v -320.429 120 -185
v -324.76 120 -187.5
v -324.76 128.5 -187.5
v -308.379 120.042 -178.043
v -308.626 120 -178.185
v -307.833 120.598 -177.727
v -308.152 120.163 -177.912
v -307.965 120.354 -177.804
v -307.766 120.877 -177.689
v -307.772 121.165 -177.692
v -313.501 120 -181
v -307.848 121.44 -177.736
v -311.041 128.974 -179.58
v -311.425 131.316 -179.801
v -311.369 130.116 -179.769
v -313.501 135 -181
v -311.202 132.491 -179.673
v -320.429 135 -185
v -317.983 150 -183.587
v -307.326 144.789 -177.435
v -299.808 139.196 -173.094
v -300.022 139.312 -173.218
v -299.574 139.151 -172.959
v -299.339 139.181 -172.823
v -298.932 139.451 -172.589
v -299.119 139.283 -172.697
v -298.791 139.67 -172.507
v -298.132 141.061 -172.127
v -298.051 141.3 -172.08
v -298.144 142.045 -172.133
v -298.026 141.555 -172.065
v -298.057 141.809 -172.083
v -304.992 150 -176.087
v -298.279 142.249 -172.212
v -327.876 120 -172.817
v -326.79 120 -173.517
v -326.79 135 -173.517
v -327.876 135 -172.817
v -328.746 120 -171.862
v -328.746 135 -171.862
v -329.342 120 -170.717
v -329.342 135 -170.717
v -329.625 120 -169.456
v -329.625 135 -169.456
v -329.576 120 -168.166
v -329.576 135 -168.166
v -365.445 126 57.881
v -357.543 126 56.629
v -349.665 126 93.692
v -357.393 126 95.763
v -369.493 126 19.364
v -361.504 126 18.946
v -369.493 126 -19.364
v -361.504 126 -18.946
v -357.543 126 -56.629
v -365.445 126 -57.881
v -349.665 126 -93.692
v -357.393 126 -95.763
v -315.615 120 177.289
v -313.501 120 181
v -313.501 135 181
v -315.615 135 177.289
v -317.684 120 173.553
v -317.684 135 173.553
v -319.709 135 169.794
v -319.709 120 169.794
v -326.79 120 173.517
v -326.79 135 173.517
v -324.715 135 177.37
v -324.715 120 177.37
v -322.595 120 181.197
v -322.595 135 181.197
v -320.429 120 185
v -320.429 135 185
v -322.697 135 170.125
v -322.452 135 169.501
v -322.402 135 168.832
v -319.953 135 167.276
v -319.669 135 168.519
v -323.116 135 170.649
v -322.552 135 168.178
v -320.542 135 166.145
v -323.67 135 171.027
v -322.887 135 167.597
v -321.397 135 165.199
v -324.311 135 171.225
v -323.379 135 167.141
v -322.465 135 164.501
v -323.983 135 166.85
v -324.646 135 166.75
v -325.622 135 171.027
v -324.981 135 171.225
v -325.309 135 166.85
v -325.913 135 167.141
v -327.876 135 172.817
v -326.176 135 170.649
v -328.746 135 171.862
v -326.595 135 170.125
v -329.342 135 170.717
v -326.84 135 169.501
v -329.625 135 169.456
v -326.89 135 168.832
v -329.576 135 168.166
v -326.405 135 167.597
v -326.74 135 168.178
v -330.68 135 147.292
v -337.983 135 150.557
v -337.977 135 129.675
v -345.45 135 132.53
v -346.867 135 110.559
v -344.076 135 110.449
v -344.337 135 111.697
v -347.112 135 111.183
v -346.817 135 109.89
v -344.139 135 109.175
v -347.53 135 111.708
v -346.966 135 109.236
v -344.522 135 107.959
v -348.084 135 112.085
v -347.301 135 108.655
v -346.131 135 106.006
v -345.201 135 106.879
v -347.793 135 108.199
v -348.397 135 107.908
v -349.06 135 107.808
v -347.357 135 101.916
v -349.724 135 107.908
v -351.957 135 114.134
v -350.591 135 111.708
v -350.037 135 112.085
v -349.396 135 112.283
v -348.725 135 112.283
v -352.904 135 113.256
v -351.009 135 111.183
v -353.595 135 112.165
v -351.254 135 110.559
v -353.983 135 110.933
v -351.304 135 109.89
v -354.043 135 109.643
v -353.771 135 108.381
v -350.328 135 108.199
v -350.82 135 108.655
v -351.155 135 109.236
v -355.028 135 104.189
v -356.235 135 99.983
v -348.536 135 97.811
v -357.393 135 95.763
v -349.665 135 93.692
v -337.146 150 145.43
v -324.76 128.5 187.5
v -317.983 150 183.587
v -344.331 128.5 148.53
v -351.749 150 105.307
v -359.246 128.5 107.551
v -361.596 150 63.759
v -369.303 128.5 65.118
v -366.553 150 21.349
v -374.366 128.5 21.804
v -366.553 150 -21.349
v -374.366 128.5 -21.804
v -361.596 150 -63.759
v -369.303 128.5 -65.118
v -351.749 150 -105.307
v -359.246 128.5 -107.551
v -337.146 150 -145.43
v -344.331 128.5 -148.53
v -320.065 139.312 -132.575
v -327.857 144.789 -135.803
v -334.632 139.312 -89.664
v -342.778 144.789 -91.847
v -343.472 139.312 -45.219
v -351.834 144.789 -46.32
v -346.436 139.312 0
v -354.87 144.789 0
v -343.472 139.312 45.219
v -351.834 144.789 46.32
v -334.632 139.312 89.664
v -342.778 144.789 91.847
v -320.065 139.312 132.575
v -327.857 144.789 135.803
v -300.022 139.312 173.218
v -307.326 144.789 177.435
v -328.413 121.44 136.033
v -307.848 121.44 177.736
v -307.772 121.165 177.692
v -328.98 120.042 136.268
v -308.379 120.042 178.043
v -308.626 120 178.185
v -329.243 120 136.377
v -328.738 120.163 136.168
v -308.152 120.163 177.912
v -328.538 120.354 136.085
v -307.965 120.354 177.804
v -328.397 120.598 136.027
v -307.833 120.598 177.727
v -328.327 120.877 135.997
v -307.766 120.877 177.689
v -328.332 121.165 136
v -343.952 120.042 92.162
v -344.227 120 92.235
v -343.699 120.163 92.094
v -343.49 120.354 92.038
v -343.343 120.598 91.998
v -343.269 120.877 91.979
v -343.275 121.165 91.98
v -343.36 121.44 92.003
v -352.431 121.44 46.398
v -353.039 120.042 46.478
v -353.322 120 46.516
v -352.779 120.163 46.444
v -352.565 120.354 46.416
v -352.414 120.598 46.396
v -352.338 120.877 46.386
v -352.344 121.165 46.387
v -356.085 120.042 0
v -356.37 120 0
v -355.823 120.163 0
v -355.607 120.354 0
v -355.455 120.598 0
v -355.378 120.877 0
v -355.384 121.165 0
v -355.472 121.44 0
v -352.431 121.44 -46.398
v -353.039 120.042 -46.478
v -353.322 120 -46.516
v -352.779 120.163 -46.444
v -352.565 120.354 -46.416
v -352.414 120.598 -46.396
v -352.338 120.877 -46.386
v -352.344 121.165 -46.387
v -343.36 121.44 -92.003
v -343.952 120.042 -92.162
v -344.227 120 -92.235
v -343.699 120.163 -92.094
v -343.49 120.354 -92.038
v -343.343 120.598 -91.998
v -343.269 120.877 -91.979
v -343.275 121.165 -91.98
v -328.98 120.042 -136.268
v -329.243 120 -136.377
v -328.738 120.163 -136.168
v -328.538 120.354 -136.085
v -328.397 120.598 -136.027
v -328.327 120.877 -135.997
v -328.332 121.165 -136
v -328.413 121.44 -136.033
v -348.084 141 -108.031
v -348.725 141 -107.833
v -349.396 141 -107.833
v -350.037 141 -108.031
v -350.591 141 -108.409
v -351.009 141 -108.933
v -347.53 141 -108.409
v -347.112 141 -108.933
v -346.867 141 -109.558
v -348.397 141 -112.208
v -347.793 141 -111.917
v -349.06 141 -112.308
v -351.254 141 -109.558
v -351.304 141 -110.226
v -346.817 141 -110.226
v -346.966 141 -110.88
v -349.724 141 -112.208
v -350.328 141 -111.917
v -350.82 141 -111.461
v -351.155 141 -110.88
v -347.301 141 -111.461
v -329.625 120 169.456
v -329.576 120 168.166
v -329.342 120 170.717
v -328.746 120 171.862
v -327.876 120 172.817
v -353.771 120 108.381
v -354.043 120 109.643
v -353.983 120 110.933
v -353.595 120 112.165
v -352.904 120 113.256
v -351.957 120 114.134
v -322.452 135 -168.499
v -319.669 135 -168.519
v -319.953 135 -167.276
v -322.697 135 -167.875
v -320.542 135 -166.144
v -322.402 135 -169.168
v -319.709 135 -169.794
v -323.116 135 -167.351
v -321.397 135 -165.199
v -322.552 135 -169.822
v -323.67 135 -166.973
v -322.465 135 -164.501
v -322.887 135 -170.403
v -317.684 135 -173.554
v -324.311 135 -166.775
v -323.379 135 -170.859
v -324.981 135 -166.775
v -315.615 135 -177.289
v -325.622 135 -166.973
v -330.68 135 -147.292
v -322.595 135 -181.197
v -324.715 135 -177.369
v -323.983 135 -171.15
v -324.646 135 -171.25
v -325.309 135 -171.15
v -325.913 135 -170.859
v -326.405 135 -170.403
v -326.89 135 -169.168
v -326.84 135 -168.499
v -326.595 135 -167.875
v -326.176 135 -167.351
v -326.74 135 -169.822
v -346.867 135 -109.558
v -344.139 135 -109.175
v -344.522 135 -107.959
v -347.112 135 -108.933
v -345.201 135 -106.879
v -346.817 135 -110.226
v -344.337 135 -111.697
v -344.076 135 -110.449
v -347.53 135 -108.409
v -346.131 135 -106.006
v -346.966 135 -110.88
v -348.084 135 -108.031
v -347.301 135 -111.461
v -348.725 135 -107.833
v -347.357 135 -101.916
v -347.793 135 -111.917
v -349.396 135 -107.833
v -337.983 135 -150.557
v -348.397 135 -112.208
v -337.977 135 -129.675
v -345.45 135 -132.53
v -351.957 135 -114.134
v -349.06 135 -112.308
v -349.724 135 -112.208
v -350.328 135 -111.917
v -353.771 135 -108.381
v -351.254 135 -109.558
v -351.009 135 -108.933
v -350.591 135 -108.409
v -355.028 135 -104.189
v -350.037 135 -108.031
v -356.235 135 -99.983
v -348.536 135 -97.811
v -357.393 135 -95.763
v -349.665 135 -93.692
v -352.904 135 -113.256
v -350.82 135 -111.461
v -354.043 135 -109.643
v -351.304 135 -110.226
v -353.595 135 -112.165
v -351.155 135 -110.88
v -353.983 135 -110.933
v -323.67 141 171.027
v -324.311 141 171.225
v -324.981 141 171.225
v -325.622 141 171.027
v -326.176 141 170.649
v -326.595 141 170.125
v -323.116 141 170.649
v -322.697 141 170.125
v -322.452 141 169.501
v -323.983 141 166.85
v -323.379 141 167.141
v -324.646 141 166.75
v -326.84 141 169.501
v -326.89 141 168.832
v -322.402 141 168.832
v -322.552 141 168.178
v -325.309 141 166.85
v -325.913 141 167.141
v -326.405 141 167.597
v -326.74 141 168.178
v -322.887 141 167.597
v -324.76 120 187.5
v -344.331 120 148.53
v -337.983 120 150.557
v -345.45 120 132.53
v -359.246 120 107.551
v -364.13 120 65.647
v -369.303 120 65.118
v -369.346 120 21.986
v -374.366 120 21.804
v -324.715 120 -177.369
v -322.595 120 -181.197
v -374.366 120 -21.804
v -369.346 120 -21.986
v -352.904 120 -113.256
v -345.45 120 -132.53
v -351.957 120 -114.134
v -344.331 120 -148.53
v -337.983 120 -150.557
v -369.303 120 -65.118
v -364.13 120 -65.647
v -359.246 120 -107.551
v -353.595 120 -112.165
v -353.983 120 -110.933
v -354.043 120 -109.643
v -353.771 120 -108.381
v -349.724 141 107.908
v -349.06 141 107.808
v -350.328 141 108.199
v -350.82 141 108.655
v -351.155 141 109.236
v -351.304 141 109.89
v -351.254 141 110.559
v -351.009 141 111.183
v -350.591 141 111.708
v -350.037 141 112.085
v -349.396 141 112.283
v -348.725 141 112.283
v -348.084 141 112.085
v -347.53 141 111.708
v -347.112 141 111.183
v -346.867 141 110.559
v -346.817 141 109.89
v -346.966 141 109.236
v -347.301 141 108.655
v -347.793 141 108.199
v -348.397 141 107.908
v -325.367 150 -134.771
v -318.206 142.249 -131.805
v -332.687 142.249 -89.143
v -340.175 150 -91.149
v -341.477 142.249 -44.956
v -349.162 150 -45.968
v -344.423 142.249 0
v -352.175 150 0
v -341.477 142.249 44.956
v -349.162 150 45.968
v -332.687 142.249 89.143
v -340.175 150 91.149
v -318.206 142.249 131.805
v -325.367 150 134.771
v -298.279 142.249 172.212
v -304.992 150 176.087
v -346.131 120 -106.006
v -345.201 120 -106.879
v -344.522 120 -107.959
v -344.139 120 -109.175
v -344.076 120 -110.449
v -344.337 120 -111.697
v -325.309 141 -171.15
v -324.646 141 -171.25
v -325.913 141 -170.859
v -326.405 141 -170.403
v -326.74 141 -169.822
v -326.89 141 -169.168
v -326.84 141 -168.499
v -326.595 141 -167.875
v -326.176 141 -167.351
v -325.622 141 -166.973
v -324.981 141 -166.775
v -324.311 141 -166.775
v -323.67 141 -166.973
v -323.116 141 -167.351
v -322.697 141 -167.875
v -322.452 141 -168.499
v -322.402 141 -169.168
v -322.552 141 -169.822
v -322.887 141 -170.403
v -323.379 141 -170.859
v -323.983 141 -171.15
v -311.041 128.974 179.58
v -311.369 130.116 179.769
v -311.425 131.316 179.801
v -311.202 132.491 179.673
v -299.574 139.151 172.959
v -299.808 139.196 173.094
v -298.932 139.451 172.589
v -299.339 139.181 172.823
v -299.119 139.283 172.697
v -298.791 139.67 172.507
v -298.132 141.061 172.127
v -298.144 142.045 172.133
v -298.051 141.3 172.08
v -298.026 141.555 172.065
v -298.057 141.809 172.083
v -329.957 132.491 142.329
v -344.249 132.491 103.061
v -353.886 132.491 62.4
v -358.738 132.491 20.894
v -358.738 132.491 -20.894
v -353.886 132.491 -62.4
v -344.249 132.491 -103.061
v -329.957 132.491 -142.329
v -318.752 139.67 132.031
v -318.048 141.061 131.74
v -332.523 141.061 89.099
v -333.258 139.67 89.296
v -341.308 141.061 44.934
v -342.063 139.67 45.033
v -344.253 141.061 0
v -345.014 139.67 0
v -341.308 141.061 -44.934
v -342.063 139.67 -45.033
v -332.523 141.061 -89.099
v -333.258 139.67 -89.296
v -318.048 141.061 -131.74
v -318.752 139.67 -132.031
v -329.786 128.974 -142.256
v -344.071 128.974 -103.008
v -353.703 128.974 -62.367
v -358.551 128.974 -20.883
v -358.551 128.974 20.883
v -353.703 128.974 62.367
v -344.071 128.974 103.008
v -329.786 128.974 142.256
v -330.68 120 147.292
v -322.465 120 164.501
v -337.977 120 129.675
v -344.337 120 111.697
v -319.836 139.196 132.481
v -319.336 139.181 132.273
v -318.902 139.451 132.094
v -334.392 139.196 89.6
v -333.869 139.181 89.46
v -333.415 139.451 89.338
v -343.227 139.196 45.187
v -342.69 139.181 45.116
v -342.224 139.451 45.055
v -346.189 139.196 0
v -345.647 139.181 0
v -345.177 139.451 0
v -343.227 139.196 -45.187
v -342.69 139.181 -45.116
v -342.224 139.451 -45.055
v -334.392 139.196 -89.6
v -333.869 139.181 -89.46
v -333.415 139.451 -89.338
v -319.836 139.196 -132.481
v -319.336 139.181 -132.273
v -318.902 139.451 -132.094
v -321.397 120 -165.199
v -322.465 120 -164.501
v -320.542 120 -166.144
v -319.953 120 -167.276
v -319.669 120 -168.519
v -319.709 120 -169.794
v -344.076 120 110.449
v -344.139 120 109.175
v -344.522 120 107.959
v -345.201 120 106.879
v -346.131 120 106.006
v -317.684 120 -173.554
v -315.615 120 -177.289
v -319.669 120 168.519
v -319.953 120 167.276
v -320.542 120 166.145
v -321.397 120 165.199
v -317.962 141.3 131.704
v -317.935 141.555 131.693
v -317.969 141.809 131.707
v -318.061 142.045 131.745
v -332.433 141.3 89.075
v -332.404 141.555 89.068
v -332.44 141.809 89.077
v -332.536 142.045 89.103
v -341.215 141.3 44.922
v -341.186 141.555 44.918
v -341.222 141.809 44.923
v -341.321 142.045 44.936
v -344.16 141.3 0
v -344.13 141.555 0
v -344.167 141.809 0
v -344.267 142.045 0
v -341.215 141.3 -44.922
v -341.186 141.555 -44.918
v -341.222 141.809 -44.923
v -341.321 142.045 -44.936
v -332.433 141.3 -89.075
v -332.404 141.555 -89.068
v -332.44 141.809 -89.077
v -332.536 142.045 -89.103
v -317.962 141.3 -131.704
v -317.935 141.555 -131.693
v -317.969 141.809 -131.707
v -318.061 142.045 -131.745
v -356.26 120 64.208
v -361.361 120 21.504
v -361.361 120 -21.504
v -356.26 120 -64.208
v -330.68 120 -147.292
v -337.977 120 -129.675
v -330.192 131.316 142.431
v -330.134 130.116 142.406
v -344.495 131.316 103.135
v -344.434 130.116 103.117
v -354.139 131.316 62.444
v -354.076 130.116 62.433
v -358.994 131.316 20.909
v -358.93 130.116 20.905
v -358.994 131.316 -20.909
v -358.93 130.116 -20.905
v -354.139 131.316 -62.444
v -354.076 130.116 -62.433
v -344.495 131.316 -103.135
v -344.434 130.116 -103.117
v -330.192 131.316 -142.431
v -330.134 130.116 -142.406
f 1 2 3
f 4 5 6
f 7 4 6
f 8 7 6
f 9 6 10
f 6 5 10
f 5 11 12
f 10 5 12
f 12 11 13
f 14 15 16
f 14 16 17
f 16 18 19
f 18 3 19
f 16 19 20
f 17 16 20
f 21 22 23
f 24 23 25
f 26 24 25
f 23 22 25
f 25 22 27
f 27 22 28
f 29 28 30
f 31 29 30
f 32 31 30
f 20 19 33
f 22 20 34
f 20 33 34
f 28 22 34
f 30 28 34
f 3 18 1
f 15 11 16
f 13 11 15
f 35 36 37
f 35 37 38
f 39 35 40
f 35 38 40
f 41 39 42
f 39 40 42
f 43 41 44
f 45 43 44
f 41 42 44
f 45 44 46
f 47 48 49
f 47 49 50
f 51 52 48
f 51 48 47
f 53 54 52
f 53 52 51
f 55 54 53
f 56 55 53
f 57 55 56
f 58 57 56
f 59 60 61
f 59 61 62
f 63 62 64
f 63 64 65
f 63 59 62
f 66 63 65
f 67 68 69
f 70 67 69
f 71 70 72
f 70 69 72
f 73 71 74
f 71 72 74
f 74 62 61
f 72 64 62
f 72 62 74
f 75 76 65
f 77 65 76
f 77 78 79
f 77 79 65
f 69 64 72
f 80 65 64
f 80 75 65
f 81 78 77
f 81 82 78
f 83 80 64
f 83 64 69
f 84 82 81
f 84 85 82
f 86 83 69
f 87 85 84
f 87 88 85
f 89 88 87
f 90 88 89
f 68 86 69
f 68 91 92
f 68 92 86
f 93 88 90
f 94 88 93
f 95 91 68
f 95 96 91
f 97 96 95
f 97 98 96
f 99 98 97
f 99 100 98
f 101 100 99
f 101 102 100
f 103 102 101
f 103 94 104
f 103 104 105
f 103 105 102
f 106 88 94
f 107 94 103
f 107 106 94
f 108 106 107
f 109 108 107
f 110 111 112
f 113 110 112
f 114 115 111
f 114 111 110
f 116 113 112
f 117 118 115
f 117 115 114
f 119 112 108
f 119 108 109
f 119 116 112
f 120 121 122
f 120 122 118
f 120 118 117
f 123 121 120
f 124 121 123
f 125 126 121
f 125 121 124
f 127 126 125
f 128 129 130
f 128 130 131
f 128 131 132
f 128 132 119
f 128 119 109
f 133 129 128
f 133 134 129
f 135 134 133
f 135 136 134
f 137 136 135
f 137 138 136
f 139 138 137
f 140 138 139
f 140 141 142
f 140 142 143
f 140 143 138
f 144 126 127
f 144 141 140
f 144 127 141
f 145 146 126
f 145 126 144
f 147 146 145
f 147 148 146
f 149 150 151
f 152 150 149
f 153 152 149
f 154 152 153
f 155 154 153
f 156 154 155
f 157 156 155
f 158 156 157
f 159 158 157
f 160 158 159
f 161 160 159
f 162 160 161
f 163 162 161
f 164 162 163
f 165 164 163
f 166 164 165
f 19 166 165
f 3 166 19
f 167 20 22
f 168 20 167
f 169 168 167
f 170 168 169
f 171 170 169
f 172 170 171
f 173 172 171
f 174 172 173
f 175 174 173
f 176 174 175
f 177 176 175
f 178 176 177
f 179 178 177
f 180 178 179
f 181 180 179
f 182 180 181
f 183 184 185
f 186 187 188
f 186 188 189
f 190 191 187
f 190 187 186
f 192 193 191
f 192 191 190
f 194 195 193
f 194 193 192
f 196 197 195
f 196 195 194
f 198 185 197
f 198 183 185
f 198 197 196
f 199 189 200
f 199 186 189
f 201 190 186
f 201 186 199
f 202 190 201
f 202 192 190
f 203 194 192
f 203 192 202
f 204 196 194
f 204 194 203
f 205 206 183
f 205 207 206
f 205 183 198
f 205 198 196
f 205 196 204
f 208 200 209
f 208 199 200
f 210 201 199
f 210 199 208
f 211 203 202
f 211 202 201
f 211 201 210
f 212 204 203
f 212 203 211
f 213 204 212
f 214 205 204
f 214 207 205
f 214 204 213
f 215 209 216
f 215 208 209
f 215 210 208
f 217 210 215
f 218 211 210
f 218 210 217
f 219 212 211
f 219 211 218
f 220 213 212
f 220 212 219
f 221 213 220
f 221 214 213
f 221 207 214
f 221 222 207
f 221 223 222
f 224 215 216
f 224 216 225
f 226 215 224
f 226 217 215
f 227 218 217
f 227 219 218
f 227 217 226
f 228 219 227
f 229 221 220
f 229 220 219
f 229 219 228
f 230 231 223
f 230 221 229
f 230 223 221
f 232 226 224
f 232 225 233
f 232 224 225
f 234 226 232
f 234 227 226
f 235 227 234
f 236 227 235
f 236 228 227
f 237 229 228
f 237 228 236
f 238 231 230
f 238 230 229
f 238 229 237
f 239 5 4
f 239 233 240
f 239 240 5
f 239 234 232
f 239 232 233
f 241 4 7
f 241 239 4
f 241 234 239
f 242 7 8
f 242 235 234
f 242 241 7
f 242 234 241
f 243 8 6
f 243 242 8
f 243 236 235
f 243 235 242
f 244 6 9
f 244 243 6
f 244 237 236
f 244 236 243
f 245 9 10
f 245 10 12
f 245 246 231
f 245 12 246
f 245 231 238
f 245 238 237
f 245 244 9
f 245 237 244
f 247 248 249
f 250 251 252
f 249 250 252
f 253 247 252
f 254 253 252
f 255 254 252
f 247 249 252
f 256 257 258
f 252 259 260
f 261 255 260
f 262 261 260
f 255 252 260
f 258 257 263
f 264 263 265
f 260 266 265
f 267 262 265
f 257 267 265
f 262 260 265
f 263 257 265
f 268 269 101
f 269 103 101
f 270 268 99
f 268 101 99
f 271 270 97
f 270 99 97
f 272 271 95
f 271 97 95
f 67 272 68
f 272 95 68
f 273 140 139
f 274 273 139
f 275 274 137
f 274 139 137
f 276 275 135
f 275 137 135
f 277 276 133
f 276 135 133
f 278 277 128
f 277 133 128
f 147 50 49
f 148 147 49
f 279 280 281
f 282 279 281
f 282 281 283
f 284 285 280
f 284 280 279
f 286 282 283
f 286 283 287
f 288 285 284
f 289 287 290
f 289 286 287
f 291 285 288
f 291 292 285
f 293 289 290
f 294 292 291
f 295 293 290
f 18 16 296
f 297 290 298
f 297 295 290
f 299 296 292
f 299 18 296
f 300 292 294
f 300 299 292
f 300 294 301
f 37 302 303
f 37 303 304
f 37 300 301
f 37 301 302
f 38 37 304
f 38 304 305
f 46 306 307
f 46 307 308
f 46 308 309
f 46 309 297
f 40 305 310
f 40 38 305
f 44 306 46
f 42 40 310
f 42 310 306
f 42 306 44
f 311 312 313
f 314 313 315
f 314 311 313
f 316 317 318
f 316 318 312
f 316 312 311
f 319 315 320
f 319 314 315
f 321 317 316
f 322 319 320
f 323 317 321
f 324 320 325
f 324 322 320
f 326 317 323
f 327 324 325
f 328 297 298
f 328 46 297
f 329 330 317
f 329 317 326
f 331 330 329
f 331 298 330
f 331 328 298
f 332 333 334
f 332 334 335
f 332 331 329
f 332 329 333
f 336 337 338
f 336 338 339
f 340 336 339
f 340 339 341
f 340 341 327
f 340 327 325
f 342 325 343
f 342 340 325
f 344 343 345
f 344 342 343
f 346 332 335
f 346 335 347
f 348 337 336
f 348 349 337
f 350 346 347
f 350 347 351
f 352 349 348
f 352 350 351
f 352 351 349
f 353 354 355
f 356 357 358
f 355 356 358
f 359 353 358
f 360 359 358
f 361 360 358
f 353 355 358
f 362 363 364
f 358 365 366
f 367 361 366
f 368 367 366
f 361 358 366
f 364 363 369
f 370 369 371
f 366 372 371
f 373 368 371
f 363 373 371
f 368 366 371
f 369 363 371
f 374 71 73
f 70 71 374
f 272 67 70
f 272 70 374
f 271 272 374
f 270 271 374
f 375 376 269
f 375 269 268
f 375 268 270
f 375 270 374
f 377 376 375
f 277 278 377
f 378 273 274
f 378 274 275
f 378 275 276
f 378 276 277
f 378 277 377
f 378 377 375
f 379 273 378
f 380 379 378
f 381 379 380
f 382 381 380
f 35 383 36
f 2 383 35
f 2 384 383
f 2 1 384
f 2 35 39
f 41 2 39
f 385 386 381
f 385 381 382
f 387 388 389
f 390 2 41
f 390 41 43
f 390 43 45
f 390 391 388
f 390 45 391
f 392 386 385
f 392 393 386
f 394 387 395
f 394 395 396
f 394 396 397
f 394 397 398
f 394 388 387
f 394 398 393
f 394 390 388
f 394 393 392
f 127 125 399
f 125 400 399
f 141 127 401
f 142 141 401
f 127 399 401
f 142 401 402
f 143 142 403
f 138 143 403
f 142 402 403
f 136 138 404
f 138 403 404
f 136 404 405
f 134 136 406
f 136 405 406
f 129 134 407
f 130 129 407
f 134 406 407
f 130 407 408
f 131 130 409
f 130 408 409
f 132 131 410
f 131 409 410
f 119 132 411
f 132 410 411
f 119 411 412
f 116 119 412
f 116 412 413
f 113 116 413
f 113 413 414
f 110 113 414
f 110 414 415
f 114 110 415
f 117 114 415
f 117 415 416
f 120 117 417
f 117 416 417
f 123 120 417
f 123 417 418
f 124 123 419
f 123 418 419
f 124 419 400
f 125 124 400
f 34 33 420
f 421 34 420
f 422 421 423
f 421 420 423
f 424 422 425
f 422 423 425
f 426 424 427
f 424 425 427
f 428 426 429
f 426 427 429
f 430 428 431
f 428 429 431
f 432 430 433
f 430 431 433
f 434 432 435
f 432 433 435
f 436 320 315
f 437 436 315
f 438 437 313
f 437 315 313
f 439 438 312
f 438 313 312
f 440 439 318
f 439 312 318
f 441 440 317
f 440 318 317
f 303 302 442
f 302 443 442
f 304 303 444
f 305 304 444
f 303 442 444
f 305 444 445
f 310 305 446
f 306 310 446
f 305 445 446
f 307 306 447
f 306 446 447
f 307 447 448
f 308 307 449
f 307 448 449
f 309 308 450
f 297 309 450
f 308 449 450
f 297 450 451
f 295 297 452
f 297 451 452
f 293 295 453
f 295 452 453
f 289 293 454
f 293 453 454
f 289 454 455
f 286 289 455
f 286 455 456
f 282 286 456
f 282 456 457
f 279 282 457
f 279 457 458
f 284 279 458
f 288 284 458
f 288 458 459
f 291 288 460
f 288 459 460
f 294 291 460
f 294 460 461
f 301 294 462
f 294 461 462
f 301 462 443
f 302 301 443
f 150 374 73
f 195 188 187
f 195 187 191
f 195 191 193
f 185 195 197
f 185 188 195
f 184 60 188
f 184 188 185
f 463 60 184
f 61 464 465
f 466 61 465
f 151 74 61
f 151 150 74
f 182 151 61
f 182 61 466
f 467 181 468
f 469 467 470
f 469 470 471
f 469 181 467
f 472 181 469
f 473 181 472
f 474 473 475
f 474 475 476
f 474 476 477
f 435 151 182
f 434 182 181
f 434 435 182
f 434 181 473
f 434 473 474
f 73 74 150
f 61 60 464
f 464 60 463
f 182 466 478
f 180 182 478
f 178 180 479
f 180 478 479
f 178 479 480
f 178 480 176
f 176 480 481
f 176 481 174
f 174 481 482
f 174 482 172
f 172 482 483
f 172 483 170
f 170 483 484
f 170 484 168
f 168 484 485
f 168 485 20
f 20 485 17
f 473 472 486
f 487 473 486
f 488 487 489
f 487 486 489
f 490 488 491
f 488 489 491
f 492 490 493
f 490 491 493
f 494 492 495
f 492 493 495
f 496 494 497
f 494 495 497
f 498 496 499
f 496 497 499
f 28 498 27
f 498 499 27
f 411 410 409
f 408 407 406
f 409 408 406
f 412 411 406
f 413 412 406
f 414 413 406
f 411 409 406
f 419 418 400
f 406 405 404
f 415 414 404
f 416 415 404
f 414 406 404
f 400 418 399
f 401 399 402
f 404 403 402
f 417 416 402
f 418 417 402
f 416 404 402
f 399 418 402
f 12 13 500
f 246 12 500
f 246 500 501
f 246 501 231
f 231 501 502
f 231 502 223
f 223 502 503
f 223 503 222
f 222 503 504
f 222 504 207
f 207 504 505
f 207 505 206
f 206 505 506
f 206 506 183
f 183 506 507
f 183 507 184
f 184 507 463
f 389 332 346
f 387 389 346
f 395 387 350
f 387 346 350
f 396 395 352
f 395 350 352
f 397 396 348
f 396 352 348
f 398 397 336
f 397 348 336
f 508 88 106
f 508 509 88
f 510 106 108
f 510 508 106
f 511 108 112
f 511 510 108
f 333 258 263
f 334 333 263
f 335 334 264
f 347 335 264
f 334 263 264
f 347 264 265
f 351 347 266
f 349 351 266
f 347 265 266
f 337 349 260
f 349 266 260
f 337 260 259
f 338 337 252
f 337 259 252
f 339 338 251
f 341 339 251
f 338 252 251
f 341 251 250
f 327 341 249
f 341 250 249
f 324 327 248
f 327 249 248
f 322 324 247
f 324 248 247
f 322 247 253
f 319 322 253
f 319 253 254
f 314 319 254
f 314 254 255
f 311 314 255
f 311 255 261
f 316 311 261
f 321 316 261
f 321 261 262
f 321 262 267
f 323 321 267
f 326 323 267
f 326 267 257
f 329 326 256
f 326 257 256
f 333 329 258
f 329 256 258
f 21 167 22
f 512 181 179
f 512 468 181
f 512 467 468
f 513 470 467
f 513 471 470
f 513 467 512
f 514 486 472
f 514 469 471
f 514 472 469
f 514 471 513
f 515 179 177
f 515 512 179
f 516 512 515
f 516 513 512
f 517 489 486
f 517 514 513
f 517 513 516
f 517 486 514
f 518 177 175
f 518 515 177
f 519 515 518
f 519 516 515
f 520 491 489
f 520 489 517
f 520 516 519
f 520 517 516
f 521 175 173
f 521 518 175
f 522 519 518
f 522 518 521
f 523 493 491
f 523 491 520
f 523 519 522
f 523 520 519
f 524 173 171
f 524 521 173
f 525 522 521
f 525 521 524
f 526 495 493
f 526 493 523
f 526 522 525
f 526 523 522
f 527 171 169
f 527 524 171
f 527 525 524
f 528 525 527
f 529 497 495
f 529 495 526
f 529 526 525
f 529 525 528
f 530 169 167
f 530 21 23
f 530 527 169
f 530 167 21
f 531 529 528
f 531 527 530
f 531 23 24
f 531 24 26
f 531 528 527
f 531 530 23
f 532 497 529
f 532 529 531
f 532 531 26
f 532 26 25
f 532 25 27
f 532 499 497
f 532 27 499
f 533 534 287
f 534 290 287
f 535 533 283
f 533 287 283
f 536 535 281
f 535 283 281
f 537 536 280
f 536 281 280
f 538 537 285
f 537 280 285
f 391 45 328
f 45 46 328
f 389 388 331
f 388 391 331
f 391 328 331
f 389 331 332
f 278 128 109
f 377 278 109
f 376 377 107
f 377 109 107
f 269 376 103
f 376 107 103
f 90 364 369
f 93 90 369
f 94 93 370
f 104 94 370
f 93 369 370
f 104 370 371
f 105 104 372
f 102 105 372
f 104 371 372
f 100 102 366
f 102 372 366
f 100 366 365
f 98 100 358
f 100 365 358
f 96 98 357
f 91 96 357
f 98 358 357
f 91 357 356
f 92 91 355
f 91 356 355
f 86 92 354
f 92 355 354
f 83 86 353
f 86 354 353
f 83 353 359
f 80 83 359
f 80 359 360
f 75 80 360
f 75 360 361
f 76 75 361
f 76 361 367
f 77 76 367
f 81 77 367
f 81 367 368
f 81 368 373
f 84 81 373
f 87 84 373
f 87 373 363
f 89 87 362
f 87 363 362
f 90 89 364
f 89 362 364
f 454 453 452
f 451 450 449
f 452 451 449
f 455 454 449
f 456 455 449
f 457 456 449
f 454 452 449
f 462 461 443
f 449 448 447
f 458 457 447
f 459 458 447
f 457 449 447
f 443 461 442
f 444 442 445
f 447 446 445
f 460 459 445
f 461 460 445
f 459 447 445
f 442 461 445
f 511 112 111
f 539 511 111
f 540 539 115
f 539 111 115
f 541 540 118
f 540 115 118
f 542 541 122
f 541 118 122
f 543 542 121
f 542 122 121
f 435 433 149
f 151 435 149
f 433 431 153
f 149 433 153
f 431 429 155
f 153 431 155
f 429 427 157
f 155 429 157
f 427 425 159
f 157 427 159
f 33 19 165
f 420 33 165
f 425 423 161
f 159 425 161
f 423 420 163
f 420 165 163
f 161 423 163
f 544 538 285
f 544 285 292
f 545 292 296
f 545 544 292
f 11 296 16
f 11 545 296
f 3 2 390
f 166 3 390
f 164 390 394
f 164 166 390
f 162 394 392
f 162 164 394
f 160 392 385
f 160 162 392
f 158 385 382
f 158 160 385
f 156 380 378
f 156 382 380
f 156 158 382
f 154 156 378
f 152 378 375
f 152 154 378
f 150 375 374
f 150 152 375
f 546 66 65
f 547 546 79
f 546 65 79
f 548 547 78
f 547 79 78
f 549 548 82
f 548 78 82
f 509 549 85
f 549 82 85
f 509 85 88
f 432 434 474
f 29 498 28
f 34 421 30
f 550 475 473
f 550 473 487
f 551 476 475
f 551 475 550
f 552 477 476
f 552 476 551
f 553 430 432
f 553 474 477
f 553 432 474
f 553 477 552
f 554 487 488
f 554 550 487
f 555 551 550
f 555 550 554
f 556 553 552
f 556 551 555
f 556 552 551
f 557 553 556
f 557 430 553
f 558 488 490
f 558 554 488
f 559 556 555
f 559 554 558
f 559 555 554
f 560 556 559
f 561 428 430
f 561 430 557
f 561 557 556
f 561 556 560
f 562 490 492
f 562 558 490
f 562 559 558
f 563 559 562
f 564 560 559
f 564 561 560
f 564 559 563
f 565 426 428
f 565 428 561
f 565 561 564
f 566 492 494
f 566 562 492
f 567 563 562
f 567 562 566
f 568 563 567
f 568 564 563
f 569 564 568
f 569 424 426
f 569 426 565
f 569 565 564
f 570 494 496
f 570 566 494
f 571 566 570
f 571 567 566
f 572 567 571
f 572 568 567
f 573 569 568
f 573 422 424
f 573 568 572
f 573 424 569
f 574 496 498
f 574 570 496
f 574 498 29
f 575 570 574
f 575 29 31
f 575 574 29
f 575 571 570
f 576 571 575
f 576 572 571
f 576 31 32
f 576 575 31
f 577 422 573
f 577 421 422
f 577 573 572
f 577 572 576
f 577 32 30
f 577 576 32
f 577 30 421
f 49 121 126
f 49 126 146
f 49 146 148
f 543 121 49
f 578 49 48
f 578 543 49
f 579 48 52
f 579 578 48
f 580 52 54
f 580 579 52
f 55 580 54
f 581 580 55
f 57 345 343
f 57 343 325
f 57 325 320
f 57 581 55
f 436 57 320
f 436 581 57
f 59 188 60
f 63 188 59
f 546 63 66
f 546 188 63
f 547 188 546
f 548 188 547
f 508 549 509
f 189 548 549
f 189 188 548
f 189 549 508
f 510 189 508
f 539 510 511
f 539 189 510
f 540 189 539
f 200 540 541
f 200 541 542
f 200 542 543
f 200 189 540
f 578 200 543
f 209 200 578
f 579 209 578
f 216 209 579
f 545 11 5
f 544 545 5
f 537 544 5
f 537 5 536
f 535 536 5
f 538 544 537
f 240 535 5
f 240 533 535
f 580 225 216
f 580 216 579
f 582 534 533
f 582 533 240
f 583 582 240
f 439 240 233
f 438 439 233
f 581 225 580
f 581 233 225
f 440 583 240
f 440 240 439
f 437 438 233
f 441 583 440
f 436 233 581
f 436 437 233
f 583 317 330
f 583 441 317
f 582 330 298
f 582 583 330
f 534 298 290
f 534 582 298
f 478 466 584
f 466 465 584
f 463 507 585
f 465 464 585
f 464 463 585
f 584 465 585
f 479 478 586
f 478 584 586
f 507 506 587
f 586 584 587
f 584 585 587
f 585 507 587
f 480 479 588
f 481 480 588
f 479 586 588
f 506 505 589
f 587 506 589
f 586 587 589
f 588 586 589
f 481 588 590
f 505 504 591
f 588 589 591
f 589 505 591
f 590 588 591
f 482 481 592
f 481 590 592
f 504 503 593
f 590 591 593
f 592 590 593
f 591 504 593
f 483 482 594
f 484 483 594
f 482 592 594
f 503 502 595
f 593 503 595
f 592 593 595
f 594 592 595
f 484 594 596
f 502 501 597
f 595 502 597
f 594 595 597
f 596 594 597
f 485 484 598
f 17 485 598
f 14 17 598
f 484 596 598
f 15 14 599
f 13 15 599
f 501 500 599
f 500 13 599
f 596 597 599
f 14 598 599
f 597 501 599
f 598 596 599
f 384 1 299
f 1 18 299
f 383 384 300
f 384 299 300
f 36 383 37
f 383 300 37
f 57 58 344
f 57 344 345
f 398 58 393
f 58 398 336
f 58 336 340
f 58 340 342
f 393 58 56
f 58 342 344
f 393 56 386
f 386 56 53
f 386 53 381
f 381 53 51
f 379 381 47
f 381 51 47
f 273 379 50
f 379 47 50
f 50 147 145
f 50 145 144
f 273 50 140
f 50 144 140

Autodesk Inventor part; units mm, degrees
ref_plane "YZ Plane" through (0, 0, 0) normal (1, 0, 0) x (0, 1, 0)
ref_plane "XZ Plane" through (0, 0, 0) normal (0, 1, 0) x (-1, 0, 0)
ref_plane "XY Plane" through (0, 0, 0) normal (0, 0, 1) x (1, 0, 0)
sketch "Skizze1" plane through (0, 0, 0) normal (0, 0, 1) x (1, 0, 0)
  arc A0 (-346.4361, 139.3117) -> (-345.0142, 139.6704) centre (-345.8915, 140.1504) ccw
  line L0 (-344.2531, 141.0614) -> (-345.0142, 139.6704)
  arc A1 (-344.2531, 141.0614) -> (-344.4232, 142.2486) centre (-345.1303, 141.5415) ccw
  line L1 (-352.1746, 150) -> (-344.4232, 142.2486)
  line L2 (-367.1746, 150) -> (-352.1746, 150)
  line L3 (-375, 128.5) -> (-367.1746, 150)
  line L4 (-375, 120) -> (-375, 128.5)
  line L5 (-356.3704, 120) -> (-375, 120)
  line L6 (0, 0) -> (-360, 0) construction
  line L7 (-356.9218, 139.1504) -> (-345, 0) construction
  line L8 (-356.9218, 139.1504) -> (0, 139.1504) construction
  line L9 (0, 139.1504) -> (0, 0) construction
  line L10 (-360, 130.6932) -> (-360, 0) construction
  line L11 (0, 0) -> (-225, 0) construction
  line L12 (-225, 0) -> (-225, 50) construction
  line L13 (-225, 50) -> (0, 50) construction
  line L14 (0, 50) -> (0, 0) construction
  line L15 (-346.4361, 139.3117) -> (-354.8697, 144.7886)
  line L16 (-360, 130.6932) -> (-355.4722, 121.4395)
  arc A2 (-356.3704, 120) -> (-355.4722, 121.4395) centre (-356.3704, 121) ccw
  line L17 (-225, 0) -> (-345, 0) construction
  line L18 (-345, 0) -> (-345, 35) construction
  line L19 (-345, 35) -> (-225, 35) construction
  line L20 (-225, 35) -> (-225, 0) construction
  line L21 (-354.8697, 144.7886) -> (-360, 130.6932)
  line L22 (-356.9218, 139.1504) -> (0, 9.2415) construction
  line L23 (-344.2531, 141.0614) -> (-355.4932, 120.52) construction
  line L24 (-368.25, 135) -> (-363.75, 135) construction
  line L25 (-363.75, 135) -> (-363.75, 141) construction
  line L26 (-363.75, 141) -> (-368.25, 141) construction
  line L27 (-368.25, 141) -> (-368.25, 135) construction
  line L28 (-367.6, 135) -> (-364.4, 135) construction
  line L29 (-364.4, 135) -> (-364.4, 129) construction
  line L30 (-364.4, 129) -> (-367.6, 129) construction
  line L31 (-367.6, 129) -> (-367.6, 135) construction
  line L32 (-369, 129) -> (-363, 129) construction
  line L33 (-363, 129) -> (-363, 126) construction
  line L34 (-363, 126) -> (-369, 126) construction
  line L35 (-369, 126) -> (-369, 129) construction
  arc A3 (-359.3455, 132.4913) -> (-359.159, 128.9744) centre (-355.1169, 130.9522) ccw
  line L36 (-362, 120) -> (-370, 120)
  line L37 (-370, 120) -> (-370, 135)
  line L38 (-370, 135) -> (-362, 135)
  line L39 (-362, 135) -> (-362, 120)
  line L40 (-370, 135) -> (-362, 135)
  line L41 (-362, 135) -> (-362, 126)
  line L42 (-362, 126) -> (-370, 126)
  line L43 (-370, 126) -> (-370, 135)
  line L44 (-360, 130.6932) -> (-360, 120)
  point P0 (-366, 129)
  point P1 (-366, 135)
  dimension "d1" = 30
  dimension "d5" = 1
  dimension "d9" = 135
  dimension "d14" = 8.5
  dimension "d18" = 360
  dimension "d25" = 50
  dimension "d26" = 225
  dimension "d31" = 15
  dimension "d40" = 3.5
  dimension "d41" = 120
  dimension "d42" = 35
  dimension "d43" = 1
  dimension "d47" = 6
  dimension "d50" = 65.103
  dimension "d54" = 15
  dimension "d59" = 12
  dimension "d60" = 160
  dimension "d66" = 15
  dimension "d70" = 4.5
  dimension "d71" = 6
  dimension "d73" = 3.2
  dimension "d74" = 3
  dimension "d75" = 6
  dimension "d76" = 6
  dimension "d77" = 6
  dimension "d79" = 4.5
  dimension "d80" = 15
  dimension "d81" = 2
  dimension "d82" = 8
  dimension "d83" = 120
revolve "Umdrehung1" add sketch "Skizze1" angle 60 mid plane about axis through (0, 139.1504, 0) along (0, -1, 0) contours L15 L21 L44 L5 L39 L38 L37 L4 L3 L2 L1 A1 L0 A0 | A3 L16 L21 | L16 A2 L5 L44
revolve "Umdrehung2" add sketch "Skizze1" angle 30 mid plane about axis through (0, 139.1504, 0) along (0, -1, 0) contours L42 L37 L38 L39
sketch "Skizze2" plane through (-320.4294, 135, -185) normal (0, -1, 0) x (0.866, 0, 0.5)
  arc A0 (185, 320.4294) -> (0, 0) centre (370, 0) ccw projected
  arc A1 (189, 313.5012) -> (8, 0) centre (370, 0) ccw projected
  line L0 (108.3705, 261.6295) -> (114.0273, 255.9727) projected
  arc A2 (108.3705, 261.6295) -> (12.6074, 95.763) centre (370, 0) ccw projected
  line L1 (20.3349, 93.6925) -> (12.6074, 95.763) projected
  arc A3 (114.0273, 255.9727) -> (20.3349, 93.6925) centre (370, 0) ccw projected
  line L2 (8, 0) -> (0, 0) projected
  line L3 (185, 320.4294) -> (189, 313.5012) projected
  arc A4 (187, 316.9653) -> (4, 0) centre (370, 0) ccw construction
  circle A5 centre (4.3484, 15.9647) radius 2.25
  circle A6 centre (12.6757, 79.2169) radius 2.25
  circle A7 centre (122.734, 269.8435) radius 2.25
  circle A8 centre (173.3483, 308.6813) radius 2.25
  line L4 (4.3484, 15.9647) -> (370, 0) construction
  line L5 (370, 0) -> (12.6757, 79.2169) construction
  line L6 (122.734, 269.8435) -> (370, 0) construction
  line L7 (173.3483, 308.6813) -> (370, 0) construction
  line L8 (4, 0) -> (370, 0) construction
  line L9 (187, 316.9653) -> (370, 0) construction
  circle A9 centre (173.3483, 308.6813) radius 5
  circle A10 centre (122.734, 269.8435) radius 5
  circle A11 centre (12.6757, 79.2169) radius 5
  circle A12 centre (4.3484, 15.9647) radius 5
  dimension "d85" = 2.5
  dimension "d86" = 10
  dimension "d87" = 2.5
  dimension "d88" = 10
  dimension "d89" = 4.5
  dimension "d97" = 10
hole "Bohrung1" at (-324.646, 135, -169) at (-349.0604, 135, -110.0583) at (-349.0604, 135, 110.0583) at (-324.646, 135, 169) direction (0, 1, 0) diameter 4.5 depth 6
extrude "Extrusion1" cut sketch "Skizze2" along normal through all contours A10 A0 | A0 A10 A1 | A11 A1 A0 | A0 A11 | A1 A10 | A11 A1 | A9 A0 | A0 A9 A1 | A12 A1 A0 | A0 A12 | A1 A9 | A12 A1 | A5 | A6 | A7 | A8
properties part number "LED-Ring_Element_v2"
